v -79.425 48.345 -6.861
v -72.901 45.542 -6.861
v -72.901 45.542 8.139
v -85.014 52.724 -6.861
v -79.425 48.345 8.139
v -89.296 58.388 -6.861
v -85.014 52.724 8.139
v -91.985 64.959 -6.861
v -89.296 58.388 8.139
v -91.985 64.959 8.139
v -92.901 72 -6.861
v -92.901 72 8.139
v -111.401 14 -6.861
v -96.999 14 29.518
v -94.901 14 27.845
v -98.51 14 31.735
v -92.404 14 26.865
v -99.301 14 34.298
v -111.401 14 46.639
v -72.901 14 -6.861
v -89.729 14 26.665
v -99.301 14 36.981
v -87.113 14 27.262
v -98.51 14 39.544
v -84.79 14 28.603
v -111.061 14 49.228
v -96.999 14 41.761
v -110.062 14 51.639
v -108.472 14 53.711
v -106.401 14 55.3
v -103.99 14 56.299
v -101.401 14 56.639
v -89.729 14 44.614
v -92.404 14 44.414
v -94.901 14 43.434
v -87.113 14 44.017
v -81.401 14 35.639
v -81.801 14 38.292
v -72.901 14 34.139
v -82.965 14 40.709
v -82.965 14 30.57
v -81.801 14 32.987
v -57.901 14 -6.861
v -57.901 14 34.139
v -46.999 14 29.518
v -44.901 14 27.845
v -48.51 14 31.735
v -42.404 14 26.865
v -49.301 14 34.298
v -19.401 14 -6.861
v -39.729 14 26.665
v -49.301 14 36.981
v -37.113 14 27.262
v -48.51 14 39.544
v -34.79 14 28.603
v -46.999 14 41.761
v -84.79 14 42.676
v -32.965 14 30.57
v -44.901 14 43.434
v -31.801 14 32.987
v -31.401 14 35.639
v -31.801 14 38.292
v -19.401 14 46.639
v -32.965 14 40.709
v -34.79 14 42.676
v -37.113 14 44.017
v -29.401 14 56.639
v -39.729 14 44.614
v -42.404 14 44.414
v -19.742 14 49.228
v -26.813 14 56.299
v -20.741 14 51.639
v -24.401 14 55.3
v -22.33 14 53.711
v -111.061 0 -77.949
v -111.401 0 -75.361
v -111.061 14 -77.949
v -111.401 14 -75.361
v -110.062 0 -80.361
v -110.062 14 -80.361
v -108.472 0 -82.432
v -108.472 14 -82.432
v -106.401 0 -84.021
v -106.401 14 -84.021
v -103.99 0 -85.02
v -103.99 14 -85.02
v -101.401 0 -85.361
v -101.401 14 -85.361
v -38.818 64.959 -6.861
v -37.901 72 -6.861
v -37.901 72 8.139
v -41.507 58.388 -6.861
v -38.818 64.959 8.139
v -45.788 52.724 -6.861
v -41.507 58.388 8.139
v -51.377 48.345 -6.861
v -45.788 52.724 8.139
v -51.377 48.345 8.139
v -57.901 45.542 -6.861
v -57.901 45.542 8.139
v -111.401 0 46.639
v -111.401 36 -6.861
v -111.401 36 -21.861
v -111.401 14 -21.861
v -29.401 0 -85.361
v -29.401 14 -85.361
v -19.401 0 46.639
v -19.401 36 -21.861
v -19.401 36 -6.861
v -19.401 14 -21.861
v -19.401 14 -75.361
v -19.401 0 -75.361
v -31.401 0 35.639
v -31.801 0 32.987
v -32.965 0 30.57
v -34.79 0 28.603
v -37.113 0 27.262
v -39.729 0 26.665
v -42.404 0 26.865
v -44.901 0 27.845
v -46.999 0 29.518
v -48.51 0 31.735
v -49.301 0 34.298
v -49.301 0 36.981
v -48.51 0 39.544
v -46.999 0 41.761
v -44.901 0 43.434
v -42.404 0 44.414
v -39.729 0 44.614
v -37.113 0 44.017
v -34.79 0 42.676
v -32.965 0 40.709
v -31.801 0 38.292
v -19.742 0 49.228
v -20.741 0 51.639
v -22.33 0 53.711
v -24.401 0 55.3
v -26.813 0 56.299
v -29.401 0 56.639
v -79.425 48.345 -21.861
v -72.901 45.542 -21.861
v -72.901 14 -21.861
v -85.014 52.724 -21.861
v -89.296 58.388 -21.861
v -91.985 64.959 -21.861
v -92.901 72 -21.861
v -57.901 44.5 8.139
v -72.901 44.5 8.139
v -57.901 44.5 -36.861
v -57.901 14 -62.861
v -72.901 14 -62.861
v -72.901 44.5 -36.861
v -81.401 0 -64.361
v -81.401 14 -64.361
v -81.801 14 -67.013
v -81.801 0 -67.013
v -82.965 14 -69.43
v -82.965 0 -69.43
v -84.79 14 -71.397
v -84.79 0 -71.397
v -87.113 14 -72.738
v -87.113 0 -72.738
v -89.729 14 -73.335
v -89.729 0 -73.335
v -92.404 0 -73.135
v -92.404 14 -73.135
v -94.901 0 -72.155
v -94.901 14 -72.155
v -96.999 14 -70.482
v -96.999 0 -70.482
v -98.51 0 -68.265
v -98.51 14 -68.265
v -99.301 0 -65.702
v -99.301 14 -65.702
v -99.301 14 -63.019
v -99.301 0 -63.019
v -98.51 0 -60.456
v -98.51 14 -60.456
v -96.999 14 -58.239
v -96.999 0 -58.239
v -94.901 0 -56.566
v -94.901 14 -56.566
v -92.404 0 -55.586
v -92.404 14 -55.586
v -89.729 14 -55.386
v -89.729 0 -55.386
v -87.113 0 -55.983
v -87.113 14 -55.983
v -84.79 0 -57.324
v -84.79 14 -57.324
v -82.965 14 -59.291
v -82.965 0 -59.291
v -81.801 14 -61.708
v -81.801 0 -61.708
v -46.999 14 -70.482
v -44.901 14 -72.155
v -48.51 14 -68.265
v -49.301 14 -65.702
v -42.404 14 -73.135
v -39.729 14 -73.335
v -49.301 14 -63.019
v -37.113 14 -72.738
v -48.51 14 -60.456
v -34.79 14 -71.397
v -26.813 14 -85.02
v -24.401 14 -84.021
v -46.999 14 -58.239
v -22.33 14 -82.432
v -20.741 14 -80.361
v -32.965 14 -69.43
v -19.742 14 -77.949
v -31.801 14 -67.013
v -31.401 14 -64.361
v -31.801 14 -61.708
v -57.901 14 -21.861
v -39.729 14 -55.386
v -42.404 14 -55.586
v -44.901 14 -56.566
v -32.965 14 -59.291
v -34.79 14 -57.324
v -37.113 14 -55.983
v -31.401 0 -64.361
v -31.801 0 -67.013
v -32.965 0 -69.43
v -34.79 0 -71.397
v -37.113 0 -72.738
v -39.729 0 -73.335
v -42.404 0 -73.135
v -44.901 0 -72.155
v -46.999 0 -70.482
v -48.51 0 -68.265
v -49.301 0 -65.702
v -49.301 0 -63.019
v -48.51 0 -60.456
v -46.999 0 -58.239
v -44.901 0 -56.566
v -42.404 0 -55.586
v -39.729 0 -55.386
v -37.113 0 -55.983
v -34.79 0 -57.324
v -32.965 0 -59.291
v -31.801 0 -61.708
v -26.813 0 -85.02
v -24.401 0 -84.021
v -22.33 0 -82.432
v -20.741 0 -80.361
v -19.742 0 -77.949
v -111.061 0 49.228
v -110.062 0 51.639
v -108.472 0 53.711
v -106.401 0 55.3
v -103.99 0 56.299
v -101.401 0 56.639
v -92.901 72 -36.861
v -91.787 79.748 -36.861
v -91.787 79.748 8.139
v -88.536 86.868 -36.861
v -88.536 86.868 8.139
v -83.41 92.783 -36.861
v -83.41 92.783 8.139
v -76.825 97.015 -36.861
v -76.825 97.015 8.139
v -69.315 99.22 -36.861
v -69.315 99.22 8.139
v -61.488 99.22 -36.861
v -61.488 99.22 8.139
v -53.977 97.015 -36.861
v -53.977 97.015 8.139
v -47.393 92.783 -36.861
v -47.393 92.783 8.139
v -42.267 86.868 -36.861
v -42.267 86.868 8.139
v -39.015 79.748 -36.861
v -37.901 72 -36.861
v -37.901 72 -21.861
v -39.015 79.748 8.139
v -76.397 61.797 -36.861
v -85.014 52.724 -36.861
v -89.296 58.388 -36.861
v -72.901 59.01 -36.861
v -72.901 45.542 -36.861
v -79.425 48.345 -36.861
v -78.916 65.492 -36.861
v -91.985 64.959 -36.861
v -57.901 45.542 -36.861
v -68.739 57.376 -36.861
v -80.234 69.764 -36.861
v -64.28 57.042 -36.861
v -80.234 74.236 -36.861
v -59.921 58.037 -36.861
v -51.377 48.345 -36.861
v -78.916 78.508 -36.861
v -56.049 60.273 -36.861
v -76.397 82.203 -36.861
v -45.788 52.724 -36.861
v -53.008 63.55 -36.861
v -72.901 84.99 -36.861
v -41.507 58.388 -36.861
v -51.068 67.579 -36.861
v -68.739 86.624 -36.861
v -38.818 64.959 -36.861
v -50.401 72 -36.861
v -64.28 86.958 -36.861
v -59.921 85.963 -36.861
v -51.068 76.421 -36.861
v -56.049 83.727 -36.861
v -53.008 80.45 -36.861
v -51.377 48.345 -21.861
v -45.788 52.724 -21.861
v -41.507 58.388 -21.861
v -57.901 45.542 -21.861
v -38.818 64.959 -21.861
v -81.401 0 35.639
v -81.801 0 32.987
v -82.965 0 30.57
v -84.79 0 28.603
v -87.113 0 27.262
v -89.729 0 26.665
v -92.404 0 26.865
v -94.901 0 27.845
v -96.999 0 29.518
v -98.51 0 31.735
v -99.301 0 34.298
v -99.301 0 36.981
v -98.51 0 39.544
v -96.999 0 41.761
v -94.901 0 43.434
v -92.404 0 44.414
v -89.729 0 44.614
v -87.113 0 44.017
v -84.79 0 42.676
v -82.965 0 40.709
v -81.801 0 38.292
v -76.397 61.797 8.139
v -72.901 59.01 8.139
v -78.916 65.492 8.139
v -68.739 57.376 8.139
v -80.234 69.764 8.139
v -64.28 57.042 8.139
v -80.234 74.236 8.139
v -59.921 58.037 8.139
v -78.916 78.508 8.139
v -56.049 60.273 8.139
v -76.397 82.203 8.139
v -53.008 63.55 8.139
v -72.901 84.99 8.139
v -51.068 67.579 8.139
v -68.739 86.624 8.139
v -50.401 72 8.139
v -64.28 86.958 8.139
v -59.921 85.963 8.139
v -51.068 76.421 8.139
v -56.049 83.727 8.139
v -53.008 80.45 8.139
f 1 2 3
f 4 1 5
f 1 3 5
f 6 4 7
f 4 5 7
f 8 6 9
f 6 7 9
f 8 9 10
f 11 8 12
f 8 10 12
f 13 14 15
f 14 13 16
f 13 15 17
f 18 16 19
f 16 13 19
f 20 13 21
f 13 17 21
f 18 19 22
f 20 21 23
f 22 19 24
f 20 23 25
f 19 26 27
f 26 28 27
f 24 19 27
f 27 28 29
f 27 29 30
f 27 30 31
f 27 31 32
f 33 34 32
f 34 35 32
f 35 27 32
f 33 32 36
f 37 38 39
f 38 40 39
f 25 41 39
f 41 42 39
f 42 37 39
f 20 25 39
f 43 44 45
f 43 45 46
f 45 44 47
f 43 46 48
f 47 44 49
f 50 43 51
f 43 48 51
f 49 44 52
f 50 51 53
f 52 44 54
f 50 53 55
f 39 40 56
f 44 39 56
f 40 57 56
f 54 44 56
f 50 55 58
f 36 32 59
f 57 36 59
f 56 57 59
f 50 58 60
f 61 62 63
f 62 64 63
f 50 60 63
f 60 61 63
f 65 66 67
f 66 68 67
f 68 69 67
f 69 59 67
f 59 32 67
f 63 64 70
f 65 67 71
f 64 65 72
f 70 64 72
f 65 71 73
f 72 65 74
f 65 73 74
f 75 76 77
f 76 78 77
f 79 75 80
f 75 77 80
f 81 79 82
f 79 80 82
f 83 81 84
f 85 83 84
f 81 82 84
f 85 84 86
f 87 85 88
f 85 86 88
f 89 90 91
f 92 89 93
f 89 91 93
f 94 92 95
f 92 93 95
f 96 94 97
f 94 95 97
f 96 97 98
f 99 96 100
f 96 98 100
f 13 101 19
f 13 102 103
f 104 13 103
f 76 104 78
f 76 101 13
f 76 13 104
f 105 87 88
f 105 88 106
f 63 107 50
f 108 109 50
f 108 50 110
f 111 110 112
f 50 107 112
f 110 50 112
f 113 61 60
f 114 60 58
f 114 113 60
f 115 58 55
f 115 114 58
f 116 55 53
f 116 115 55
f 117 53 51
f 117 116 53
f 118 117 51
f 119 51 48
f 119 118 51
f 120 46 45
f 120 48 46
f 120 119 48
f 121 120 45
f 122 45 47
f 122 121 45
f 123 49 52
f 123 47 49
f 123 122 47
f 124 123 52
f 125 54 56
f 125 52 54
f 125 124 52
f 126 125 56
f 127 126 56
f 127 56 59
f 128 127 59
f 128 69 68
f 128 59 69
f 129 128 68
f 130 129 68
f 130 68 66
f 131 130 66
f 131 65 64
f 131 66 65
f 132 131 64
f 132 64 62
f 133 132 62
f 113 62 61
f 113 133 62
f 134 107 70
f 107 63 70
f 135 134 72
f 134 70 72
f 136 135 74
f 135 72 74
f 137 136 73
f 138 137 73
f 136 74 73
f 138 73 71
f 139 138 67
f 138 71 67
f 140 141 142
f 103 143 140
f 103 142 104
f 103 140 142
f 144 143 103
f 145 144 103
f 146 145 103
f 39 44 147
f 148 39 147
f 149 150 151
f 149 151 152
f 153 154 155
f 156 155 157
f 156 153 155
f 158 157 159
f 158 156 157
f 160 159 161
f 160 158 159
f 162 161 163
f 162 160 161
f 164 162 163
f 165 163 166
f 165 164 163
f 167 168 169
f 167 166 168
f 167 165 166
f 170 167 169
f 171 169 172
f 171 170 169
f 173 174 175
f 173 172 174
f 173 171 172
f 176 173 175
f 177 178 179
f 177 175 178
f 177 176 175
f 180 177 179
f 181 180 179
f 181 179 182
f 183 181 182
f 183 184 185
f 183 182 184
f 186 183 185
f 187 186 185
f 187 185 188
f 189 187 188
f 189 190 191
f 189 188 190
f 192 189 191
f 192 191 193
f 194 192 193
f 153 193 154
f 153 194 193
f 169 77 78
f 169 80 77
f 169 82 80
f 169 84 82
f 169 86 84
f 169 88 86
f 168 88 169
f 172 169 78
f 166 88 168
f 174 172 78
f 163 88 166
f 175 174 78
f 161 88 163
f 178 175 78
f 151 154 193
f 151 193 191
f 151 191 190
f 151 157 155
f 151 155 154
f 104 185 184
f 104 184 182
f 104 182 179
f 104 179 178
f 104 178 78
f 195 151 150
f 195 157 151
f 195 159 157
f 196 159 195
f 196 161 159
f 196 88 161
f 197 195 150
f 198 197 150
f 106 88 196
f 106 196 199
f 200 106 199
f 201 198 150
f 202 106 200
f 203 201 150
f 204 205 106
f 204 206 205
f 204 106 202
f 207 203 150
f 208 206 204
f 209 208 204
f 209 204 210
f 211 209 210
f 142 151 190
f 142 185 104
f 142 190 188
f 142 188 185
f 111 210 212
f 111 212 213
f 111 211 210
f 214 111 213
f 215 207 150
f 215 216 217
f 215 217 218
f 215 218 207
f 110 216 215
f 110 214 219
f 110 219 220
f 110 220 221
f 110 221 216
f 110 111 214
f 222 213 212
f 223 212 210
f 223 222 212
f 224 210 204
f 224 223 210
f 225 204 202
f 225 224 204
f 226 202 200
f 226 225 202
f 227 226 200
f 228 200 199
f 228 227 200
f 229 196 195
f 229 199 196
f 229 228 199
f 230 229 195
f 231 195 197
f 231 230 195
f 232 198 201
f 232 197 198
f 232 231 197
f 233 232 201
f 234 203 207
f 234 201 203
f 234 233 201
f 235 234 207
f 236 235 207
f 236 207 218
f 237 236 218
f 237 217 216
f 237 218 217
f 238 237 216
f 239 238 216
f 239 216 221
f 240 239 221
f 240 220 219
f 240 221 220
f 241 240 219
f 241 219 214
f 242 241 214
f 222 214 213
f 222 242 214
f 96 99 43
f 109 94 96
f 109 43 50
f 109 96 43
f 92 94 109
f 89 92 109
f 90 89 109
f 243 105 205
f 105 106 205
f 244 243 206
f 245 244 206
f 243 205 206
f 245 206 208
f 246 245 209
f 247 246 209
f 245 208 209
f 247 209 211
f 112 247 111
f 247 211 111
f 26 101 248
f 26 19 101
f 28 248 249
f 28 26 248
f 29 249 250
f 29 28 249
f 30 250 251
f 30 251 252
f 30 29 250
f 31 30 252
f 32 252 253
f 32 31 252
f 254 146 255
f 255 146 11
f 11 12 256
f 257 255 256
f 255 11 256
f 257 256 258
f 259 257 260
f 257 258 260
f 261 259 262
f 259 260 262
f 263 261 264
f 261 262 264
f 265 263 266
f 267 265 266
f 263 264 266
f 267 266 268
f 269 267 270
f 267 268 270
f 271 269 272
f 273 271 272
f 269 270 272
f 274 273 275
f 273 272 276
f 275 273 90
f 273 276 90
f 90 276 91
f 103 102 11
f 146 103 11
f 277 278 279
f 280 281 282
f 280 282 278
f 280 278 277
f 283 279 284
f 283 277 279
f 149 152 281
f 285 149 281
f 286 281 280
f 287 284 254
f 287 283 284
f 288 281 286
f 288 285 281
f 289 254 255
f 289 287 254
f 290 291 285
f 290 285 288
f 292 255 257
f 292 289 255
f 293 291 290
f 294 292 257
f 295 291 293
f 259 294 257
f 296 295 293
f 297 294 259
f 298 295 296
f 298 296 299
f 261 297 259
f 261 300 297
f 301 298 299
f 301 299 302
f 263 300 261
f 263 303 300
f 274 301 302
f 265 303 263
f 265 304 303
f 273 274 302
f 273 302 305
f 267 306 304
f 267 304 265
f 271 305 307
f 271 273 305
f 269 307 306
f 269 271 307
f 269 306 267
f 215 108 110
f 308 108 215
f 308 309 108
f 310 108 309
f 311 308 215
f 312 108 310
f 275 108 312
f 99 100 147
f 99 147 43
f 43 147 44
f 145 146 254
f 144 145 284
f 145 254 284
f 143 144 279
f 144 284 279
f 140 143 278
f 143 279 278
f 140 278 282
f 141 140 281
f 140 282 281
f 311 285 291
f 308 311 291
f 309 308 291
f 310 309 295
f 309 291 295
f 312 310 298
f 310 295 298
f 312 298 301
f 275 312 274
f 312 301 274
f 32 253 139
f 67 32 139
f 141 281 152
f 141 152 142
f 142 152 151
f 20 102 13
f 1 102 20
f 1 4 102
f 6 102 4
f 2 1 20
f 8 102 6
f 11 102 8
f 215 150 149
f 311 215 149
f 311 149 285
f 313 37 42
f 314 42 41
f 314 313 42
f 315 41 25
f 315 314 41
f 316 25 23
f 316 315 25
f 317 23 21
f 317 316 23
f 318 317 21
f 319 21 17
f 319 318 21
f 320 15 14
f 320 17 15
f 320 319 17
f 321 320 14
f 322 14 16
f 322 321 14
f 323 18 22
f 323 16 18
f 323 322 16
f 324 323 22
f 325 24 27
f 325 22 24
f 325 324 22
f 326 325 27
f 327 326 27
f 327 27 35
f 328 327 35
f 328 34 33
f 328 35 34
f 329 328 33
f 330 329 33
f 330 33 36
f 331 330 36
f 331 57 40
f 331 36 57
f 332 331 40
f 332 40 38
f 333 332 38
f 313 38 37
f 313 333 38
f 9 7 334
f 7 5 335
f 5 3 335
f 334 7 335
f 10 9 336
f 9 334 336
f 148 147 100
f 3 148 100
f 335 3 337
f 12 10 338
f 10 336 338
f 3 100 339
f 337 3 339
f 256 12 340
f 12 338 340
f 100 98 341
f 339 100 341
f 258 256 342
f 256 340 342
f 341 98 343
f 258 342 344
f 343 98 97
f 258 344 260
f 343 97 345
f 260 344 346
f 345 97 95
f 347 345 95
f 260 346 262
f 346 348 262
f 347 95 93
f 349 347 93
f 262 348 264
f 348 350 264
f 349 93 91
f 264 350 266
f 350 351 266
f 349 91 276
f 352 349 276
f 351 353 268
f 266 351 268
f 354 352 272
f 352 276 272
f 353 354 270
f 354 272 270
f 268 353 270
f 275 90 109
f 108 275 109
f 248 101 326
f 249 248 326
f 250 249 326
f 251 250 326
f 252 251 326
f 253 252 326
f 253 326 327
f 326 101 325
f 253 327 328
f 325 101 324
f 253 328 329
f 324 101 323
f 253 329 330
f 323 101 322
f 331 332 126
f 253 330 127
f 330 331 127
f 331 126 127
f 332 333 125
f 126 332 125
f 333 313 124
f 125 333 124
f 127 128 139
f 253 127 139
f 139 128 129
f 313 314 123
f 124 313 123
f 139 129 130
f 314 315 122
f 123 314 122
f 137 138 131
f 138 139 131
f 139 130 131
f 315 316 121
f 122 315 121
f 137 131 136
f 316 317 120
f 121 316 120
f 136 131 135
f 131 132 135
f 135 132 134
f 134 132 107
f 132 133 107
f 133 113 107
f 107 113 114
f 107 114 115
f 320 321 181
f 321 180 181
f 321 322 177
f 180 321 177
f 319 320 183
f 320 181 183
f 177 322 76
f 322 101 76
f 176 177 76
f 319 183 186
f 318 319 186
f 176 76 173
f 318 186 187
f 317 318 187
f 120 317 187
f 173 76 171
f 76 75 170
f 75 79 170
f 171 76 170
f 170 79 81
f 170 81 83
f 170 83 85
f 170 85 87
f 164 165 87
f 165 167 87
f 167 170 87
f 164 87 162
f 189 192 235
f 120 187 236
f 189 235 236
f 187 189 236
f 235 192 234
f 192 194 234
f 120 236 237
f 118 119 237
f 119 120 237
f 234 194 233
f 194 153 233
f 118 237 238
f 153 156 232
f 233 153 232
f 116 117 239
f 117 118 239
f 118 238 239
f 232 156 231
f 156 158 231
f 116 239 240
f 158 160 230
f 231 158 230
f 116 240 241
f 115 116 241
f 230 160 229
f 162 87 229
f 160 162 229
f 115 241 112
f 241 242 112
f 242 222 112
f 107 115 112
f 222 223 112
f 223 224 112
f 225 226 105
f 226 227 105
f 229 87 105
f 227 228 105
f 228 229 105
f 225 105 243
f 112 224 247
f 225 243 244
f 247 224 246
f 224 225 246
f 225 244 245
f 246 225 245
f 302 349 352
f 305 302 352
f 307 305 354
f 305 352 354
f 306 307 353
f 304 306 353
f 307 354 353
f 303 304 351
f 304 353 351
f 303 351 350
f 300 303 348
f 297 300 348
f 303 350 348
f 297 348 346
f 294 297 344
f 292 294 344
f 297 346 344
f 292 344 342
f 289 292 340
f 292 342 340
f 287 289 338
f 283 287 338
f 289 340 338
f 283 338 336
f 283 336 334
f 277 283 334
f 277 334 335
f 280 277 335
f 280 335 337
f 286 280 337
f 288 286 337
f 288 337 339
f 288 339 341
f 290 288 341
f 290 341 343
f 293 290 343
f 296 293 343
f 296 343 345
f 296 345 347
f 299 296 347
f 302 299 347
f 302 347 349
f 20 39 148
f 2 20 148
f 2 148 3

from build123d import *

# Parameters (mm, degrees)
CROQUIS1_W              = 92
CROQUIS1_H              = 142
CROQUIS1_R              = 9
SALIENTE_EXTRUIR1_DEPTH = 100
CROQUIS2_R              = 15
CORTAR_EXTRUIR1_DEPTH   = 142
CORTAR_EXTRUIR2_DEPTH   = 92
CORTAR_EXTRUIR3_DEPTH   = 63.5
CORTAR_EXTRUIR4_DEPTH   = 63.5
REDONDEO1_R             = 10


with BuildPart() as part:
    # Croquis1 → Saliente-Extruir1 (new body)
    with BuildSketch(Plane(origin=(0, 0, 0), x_dir=(1, 0, 0), z_dir=(0, 1, 0))):
        with Locations((-65.401360544, 14.360544218)):
            Rectangle(CROQUIS1_W, CROQUIS1_H)
        with Locations((-90.401360544, 64.360544218)):
            Circle(CROQUIS1_R, mode=Mode.SUBTRACT)
        with Locations((-90.401360544, -35.639455782)):
            Circle(CROQUIS1_R, mode=Mode.SUBTRACT)
        with Locations((-40.401360544, 64.360544218)):
            Circle(CROQUIS1_R, mode=Mode.SUBTRACT)
        with Locations((-40.401360544, -35.639455782)):
            Circle(CROQUIS1_R, mode=Mode.SUBTRACT)
    extrude(amount=SALIENTE_EXTRUIR1_DEPTH)

    # Croquis2 → Cortar-Extruir1 (cut)
    with BuildSketch(Plane.XY.offset(56.639455782)):
        with BuildLine():
            Line((-111.401360544, 36), (-92.901360544, 72))
            ThreePointArc((-92.901360544, 72), (-65.401360544, 99.5), (-37.901360544, 72))
            Line((-37.901360544, 72), (-19.401360544, 36))
            Line((-19.401360544, 36), (-19.401360544, 100))
            Line((-19.401360544, 100), (-111.401360544, 100))
            Line((-111.401360544, 100), (-111.401360544, 36))
        make_face()
        with Locations((-65.401360544, 72)):
            Circle(CROQUIS2_R)
    extrude(amount=-CORTAR_EXTRUIR1_DEPTH, mode=Mode.SUBTRACT)

    # Croquis3 → Cortar-Extruir2 (cut)
    with BuildSketch(Plane(origin=(-19.401360544, 0, 0), x_dir=(0, 0, -1), z_dir=(1, 0, 0))):
        Polygon((62.860544218, 14), (36.860544218, 44.5), (36.860544218, 99.5), (85.360544218, 99.5), (85.360544218, 14), align=None)
        Polygon((-56.639455782, 14), (-34.139455782, 14), (-8.139455782, 44.5), (-8.139455782, 99.5), (-56.639455782, 99.5), align=None)
    extrude(amount=-CORTAR_EXTRUIR2_DEPTH, mode=Mode.SUBTRACT)

    # Croquis4 → Cortar-Extruir3 (cut)
    with BuildSketch(Plane.XY.offset(56.639455782)):
        with BuildLine():
            Line((-92.901360544, 72), (-111.401360544, 36))
            Line((-111.401360544, 36), (-111.401360544, 14))
            Line((-111.401360544, 14), (-72.901360544, 14))
            Line((-72.901360544, 14), (-72.901360544, 45.542486889))
            ThreePointArc((-72.901360544, 45.542486889), (-87.338771513, 55.416876048), (-92.901360544, 72))
        make_face()
        with BuildLine():
            Line((-19.401360544, 36), (-37.901360544, 72))
            ThreePointArc((-37.901360544, 72), (-43.463949576, 55.416876048), (-57.901360544, 45.542486889))
            Line((-57.901360544, 45.542486889), (-57.901360544, 14))
            Line((-57.901360544, 14), (-19.401360544, 14))
            Line((-19.401360544, 14), (-19.401360544, 36))
        make_face()
    extrude(amount=-CORTAR_EXTRUIR3_DEPTH, mode=Mode.SUBTRACT)

    # Croquis7 → Cortar-Extruir4 (cut)
    with BuildSketch(Plane(origin=(0, 0, -85.360544218), x_dir=(-1, 0, 0), z_dir=(0, 0, -1))):
        with BuildLine():
            Line((57.901360544, 14), (57.901360544, 45.542486889))
            ThreePointArc((57.901360544, 45.542486889), (43.463949576, 55.416876048), (37.901360544, 72))
            Line((37.901360544, 72), (19.401360544, 36))
            Line((19.401360544, 36), (19.401360544, 14))
            Line((19.401360544, 14), (57.901360544, 14))
        make_face()
        with BuildLine():
            ThreePointArc((92.901360544, 72), (87.338771513, 55.416876048), (72.901360544, 45.542486889))
            Line((72.901360544, 45.542486889), (72.901360544, 14))
            Line((72.901360544, 14), (111.401360544, 14))
            Line((111.401360544, 14), (111.401360544, 36))
            Line((111.401360544, 36), (92.901360544, 72))
        make_face()
    extrude(amount=-CORTAR_EXTRUIR4_DEPTH, mode=Mode.SUBTRACT)

    # Redondeo1
    redondeo1_edges = [part.edges().sort_by_distance(p)[0] for p in [
        (-19.401360544, 7, -85.360544218),
        (-111.401360544, 7, -85.360544218),
        (-19.401360544, 7, 56.639455782),
        (-111.401360544, 7, 56.639455782),
    ]]
    fillet(redondeo1_edges, radius=REDONDEO1_R)


solid = part.part
